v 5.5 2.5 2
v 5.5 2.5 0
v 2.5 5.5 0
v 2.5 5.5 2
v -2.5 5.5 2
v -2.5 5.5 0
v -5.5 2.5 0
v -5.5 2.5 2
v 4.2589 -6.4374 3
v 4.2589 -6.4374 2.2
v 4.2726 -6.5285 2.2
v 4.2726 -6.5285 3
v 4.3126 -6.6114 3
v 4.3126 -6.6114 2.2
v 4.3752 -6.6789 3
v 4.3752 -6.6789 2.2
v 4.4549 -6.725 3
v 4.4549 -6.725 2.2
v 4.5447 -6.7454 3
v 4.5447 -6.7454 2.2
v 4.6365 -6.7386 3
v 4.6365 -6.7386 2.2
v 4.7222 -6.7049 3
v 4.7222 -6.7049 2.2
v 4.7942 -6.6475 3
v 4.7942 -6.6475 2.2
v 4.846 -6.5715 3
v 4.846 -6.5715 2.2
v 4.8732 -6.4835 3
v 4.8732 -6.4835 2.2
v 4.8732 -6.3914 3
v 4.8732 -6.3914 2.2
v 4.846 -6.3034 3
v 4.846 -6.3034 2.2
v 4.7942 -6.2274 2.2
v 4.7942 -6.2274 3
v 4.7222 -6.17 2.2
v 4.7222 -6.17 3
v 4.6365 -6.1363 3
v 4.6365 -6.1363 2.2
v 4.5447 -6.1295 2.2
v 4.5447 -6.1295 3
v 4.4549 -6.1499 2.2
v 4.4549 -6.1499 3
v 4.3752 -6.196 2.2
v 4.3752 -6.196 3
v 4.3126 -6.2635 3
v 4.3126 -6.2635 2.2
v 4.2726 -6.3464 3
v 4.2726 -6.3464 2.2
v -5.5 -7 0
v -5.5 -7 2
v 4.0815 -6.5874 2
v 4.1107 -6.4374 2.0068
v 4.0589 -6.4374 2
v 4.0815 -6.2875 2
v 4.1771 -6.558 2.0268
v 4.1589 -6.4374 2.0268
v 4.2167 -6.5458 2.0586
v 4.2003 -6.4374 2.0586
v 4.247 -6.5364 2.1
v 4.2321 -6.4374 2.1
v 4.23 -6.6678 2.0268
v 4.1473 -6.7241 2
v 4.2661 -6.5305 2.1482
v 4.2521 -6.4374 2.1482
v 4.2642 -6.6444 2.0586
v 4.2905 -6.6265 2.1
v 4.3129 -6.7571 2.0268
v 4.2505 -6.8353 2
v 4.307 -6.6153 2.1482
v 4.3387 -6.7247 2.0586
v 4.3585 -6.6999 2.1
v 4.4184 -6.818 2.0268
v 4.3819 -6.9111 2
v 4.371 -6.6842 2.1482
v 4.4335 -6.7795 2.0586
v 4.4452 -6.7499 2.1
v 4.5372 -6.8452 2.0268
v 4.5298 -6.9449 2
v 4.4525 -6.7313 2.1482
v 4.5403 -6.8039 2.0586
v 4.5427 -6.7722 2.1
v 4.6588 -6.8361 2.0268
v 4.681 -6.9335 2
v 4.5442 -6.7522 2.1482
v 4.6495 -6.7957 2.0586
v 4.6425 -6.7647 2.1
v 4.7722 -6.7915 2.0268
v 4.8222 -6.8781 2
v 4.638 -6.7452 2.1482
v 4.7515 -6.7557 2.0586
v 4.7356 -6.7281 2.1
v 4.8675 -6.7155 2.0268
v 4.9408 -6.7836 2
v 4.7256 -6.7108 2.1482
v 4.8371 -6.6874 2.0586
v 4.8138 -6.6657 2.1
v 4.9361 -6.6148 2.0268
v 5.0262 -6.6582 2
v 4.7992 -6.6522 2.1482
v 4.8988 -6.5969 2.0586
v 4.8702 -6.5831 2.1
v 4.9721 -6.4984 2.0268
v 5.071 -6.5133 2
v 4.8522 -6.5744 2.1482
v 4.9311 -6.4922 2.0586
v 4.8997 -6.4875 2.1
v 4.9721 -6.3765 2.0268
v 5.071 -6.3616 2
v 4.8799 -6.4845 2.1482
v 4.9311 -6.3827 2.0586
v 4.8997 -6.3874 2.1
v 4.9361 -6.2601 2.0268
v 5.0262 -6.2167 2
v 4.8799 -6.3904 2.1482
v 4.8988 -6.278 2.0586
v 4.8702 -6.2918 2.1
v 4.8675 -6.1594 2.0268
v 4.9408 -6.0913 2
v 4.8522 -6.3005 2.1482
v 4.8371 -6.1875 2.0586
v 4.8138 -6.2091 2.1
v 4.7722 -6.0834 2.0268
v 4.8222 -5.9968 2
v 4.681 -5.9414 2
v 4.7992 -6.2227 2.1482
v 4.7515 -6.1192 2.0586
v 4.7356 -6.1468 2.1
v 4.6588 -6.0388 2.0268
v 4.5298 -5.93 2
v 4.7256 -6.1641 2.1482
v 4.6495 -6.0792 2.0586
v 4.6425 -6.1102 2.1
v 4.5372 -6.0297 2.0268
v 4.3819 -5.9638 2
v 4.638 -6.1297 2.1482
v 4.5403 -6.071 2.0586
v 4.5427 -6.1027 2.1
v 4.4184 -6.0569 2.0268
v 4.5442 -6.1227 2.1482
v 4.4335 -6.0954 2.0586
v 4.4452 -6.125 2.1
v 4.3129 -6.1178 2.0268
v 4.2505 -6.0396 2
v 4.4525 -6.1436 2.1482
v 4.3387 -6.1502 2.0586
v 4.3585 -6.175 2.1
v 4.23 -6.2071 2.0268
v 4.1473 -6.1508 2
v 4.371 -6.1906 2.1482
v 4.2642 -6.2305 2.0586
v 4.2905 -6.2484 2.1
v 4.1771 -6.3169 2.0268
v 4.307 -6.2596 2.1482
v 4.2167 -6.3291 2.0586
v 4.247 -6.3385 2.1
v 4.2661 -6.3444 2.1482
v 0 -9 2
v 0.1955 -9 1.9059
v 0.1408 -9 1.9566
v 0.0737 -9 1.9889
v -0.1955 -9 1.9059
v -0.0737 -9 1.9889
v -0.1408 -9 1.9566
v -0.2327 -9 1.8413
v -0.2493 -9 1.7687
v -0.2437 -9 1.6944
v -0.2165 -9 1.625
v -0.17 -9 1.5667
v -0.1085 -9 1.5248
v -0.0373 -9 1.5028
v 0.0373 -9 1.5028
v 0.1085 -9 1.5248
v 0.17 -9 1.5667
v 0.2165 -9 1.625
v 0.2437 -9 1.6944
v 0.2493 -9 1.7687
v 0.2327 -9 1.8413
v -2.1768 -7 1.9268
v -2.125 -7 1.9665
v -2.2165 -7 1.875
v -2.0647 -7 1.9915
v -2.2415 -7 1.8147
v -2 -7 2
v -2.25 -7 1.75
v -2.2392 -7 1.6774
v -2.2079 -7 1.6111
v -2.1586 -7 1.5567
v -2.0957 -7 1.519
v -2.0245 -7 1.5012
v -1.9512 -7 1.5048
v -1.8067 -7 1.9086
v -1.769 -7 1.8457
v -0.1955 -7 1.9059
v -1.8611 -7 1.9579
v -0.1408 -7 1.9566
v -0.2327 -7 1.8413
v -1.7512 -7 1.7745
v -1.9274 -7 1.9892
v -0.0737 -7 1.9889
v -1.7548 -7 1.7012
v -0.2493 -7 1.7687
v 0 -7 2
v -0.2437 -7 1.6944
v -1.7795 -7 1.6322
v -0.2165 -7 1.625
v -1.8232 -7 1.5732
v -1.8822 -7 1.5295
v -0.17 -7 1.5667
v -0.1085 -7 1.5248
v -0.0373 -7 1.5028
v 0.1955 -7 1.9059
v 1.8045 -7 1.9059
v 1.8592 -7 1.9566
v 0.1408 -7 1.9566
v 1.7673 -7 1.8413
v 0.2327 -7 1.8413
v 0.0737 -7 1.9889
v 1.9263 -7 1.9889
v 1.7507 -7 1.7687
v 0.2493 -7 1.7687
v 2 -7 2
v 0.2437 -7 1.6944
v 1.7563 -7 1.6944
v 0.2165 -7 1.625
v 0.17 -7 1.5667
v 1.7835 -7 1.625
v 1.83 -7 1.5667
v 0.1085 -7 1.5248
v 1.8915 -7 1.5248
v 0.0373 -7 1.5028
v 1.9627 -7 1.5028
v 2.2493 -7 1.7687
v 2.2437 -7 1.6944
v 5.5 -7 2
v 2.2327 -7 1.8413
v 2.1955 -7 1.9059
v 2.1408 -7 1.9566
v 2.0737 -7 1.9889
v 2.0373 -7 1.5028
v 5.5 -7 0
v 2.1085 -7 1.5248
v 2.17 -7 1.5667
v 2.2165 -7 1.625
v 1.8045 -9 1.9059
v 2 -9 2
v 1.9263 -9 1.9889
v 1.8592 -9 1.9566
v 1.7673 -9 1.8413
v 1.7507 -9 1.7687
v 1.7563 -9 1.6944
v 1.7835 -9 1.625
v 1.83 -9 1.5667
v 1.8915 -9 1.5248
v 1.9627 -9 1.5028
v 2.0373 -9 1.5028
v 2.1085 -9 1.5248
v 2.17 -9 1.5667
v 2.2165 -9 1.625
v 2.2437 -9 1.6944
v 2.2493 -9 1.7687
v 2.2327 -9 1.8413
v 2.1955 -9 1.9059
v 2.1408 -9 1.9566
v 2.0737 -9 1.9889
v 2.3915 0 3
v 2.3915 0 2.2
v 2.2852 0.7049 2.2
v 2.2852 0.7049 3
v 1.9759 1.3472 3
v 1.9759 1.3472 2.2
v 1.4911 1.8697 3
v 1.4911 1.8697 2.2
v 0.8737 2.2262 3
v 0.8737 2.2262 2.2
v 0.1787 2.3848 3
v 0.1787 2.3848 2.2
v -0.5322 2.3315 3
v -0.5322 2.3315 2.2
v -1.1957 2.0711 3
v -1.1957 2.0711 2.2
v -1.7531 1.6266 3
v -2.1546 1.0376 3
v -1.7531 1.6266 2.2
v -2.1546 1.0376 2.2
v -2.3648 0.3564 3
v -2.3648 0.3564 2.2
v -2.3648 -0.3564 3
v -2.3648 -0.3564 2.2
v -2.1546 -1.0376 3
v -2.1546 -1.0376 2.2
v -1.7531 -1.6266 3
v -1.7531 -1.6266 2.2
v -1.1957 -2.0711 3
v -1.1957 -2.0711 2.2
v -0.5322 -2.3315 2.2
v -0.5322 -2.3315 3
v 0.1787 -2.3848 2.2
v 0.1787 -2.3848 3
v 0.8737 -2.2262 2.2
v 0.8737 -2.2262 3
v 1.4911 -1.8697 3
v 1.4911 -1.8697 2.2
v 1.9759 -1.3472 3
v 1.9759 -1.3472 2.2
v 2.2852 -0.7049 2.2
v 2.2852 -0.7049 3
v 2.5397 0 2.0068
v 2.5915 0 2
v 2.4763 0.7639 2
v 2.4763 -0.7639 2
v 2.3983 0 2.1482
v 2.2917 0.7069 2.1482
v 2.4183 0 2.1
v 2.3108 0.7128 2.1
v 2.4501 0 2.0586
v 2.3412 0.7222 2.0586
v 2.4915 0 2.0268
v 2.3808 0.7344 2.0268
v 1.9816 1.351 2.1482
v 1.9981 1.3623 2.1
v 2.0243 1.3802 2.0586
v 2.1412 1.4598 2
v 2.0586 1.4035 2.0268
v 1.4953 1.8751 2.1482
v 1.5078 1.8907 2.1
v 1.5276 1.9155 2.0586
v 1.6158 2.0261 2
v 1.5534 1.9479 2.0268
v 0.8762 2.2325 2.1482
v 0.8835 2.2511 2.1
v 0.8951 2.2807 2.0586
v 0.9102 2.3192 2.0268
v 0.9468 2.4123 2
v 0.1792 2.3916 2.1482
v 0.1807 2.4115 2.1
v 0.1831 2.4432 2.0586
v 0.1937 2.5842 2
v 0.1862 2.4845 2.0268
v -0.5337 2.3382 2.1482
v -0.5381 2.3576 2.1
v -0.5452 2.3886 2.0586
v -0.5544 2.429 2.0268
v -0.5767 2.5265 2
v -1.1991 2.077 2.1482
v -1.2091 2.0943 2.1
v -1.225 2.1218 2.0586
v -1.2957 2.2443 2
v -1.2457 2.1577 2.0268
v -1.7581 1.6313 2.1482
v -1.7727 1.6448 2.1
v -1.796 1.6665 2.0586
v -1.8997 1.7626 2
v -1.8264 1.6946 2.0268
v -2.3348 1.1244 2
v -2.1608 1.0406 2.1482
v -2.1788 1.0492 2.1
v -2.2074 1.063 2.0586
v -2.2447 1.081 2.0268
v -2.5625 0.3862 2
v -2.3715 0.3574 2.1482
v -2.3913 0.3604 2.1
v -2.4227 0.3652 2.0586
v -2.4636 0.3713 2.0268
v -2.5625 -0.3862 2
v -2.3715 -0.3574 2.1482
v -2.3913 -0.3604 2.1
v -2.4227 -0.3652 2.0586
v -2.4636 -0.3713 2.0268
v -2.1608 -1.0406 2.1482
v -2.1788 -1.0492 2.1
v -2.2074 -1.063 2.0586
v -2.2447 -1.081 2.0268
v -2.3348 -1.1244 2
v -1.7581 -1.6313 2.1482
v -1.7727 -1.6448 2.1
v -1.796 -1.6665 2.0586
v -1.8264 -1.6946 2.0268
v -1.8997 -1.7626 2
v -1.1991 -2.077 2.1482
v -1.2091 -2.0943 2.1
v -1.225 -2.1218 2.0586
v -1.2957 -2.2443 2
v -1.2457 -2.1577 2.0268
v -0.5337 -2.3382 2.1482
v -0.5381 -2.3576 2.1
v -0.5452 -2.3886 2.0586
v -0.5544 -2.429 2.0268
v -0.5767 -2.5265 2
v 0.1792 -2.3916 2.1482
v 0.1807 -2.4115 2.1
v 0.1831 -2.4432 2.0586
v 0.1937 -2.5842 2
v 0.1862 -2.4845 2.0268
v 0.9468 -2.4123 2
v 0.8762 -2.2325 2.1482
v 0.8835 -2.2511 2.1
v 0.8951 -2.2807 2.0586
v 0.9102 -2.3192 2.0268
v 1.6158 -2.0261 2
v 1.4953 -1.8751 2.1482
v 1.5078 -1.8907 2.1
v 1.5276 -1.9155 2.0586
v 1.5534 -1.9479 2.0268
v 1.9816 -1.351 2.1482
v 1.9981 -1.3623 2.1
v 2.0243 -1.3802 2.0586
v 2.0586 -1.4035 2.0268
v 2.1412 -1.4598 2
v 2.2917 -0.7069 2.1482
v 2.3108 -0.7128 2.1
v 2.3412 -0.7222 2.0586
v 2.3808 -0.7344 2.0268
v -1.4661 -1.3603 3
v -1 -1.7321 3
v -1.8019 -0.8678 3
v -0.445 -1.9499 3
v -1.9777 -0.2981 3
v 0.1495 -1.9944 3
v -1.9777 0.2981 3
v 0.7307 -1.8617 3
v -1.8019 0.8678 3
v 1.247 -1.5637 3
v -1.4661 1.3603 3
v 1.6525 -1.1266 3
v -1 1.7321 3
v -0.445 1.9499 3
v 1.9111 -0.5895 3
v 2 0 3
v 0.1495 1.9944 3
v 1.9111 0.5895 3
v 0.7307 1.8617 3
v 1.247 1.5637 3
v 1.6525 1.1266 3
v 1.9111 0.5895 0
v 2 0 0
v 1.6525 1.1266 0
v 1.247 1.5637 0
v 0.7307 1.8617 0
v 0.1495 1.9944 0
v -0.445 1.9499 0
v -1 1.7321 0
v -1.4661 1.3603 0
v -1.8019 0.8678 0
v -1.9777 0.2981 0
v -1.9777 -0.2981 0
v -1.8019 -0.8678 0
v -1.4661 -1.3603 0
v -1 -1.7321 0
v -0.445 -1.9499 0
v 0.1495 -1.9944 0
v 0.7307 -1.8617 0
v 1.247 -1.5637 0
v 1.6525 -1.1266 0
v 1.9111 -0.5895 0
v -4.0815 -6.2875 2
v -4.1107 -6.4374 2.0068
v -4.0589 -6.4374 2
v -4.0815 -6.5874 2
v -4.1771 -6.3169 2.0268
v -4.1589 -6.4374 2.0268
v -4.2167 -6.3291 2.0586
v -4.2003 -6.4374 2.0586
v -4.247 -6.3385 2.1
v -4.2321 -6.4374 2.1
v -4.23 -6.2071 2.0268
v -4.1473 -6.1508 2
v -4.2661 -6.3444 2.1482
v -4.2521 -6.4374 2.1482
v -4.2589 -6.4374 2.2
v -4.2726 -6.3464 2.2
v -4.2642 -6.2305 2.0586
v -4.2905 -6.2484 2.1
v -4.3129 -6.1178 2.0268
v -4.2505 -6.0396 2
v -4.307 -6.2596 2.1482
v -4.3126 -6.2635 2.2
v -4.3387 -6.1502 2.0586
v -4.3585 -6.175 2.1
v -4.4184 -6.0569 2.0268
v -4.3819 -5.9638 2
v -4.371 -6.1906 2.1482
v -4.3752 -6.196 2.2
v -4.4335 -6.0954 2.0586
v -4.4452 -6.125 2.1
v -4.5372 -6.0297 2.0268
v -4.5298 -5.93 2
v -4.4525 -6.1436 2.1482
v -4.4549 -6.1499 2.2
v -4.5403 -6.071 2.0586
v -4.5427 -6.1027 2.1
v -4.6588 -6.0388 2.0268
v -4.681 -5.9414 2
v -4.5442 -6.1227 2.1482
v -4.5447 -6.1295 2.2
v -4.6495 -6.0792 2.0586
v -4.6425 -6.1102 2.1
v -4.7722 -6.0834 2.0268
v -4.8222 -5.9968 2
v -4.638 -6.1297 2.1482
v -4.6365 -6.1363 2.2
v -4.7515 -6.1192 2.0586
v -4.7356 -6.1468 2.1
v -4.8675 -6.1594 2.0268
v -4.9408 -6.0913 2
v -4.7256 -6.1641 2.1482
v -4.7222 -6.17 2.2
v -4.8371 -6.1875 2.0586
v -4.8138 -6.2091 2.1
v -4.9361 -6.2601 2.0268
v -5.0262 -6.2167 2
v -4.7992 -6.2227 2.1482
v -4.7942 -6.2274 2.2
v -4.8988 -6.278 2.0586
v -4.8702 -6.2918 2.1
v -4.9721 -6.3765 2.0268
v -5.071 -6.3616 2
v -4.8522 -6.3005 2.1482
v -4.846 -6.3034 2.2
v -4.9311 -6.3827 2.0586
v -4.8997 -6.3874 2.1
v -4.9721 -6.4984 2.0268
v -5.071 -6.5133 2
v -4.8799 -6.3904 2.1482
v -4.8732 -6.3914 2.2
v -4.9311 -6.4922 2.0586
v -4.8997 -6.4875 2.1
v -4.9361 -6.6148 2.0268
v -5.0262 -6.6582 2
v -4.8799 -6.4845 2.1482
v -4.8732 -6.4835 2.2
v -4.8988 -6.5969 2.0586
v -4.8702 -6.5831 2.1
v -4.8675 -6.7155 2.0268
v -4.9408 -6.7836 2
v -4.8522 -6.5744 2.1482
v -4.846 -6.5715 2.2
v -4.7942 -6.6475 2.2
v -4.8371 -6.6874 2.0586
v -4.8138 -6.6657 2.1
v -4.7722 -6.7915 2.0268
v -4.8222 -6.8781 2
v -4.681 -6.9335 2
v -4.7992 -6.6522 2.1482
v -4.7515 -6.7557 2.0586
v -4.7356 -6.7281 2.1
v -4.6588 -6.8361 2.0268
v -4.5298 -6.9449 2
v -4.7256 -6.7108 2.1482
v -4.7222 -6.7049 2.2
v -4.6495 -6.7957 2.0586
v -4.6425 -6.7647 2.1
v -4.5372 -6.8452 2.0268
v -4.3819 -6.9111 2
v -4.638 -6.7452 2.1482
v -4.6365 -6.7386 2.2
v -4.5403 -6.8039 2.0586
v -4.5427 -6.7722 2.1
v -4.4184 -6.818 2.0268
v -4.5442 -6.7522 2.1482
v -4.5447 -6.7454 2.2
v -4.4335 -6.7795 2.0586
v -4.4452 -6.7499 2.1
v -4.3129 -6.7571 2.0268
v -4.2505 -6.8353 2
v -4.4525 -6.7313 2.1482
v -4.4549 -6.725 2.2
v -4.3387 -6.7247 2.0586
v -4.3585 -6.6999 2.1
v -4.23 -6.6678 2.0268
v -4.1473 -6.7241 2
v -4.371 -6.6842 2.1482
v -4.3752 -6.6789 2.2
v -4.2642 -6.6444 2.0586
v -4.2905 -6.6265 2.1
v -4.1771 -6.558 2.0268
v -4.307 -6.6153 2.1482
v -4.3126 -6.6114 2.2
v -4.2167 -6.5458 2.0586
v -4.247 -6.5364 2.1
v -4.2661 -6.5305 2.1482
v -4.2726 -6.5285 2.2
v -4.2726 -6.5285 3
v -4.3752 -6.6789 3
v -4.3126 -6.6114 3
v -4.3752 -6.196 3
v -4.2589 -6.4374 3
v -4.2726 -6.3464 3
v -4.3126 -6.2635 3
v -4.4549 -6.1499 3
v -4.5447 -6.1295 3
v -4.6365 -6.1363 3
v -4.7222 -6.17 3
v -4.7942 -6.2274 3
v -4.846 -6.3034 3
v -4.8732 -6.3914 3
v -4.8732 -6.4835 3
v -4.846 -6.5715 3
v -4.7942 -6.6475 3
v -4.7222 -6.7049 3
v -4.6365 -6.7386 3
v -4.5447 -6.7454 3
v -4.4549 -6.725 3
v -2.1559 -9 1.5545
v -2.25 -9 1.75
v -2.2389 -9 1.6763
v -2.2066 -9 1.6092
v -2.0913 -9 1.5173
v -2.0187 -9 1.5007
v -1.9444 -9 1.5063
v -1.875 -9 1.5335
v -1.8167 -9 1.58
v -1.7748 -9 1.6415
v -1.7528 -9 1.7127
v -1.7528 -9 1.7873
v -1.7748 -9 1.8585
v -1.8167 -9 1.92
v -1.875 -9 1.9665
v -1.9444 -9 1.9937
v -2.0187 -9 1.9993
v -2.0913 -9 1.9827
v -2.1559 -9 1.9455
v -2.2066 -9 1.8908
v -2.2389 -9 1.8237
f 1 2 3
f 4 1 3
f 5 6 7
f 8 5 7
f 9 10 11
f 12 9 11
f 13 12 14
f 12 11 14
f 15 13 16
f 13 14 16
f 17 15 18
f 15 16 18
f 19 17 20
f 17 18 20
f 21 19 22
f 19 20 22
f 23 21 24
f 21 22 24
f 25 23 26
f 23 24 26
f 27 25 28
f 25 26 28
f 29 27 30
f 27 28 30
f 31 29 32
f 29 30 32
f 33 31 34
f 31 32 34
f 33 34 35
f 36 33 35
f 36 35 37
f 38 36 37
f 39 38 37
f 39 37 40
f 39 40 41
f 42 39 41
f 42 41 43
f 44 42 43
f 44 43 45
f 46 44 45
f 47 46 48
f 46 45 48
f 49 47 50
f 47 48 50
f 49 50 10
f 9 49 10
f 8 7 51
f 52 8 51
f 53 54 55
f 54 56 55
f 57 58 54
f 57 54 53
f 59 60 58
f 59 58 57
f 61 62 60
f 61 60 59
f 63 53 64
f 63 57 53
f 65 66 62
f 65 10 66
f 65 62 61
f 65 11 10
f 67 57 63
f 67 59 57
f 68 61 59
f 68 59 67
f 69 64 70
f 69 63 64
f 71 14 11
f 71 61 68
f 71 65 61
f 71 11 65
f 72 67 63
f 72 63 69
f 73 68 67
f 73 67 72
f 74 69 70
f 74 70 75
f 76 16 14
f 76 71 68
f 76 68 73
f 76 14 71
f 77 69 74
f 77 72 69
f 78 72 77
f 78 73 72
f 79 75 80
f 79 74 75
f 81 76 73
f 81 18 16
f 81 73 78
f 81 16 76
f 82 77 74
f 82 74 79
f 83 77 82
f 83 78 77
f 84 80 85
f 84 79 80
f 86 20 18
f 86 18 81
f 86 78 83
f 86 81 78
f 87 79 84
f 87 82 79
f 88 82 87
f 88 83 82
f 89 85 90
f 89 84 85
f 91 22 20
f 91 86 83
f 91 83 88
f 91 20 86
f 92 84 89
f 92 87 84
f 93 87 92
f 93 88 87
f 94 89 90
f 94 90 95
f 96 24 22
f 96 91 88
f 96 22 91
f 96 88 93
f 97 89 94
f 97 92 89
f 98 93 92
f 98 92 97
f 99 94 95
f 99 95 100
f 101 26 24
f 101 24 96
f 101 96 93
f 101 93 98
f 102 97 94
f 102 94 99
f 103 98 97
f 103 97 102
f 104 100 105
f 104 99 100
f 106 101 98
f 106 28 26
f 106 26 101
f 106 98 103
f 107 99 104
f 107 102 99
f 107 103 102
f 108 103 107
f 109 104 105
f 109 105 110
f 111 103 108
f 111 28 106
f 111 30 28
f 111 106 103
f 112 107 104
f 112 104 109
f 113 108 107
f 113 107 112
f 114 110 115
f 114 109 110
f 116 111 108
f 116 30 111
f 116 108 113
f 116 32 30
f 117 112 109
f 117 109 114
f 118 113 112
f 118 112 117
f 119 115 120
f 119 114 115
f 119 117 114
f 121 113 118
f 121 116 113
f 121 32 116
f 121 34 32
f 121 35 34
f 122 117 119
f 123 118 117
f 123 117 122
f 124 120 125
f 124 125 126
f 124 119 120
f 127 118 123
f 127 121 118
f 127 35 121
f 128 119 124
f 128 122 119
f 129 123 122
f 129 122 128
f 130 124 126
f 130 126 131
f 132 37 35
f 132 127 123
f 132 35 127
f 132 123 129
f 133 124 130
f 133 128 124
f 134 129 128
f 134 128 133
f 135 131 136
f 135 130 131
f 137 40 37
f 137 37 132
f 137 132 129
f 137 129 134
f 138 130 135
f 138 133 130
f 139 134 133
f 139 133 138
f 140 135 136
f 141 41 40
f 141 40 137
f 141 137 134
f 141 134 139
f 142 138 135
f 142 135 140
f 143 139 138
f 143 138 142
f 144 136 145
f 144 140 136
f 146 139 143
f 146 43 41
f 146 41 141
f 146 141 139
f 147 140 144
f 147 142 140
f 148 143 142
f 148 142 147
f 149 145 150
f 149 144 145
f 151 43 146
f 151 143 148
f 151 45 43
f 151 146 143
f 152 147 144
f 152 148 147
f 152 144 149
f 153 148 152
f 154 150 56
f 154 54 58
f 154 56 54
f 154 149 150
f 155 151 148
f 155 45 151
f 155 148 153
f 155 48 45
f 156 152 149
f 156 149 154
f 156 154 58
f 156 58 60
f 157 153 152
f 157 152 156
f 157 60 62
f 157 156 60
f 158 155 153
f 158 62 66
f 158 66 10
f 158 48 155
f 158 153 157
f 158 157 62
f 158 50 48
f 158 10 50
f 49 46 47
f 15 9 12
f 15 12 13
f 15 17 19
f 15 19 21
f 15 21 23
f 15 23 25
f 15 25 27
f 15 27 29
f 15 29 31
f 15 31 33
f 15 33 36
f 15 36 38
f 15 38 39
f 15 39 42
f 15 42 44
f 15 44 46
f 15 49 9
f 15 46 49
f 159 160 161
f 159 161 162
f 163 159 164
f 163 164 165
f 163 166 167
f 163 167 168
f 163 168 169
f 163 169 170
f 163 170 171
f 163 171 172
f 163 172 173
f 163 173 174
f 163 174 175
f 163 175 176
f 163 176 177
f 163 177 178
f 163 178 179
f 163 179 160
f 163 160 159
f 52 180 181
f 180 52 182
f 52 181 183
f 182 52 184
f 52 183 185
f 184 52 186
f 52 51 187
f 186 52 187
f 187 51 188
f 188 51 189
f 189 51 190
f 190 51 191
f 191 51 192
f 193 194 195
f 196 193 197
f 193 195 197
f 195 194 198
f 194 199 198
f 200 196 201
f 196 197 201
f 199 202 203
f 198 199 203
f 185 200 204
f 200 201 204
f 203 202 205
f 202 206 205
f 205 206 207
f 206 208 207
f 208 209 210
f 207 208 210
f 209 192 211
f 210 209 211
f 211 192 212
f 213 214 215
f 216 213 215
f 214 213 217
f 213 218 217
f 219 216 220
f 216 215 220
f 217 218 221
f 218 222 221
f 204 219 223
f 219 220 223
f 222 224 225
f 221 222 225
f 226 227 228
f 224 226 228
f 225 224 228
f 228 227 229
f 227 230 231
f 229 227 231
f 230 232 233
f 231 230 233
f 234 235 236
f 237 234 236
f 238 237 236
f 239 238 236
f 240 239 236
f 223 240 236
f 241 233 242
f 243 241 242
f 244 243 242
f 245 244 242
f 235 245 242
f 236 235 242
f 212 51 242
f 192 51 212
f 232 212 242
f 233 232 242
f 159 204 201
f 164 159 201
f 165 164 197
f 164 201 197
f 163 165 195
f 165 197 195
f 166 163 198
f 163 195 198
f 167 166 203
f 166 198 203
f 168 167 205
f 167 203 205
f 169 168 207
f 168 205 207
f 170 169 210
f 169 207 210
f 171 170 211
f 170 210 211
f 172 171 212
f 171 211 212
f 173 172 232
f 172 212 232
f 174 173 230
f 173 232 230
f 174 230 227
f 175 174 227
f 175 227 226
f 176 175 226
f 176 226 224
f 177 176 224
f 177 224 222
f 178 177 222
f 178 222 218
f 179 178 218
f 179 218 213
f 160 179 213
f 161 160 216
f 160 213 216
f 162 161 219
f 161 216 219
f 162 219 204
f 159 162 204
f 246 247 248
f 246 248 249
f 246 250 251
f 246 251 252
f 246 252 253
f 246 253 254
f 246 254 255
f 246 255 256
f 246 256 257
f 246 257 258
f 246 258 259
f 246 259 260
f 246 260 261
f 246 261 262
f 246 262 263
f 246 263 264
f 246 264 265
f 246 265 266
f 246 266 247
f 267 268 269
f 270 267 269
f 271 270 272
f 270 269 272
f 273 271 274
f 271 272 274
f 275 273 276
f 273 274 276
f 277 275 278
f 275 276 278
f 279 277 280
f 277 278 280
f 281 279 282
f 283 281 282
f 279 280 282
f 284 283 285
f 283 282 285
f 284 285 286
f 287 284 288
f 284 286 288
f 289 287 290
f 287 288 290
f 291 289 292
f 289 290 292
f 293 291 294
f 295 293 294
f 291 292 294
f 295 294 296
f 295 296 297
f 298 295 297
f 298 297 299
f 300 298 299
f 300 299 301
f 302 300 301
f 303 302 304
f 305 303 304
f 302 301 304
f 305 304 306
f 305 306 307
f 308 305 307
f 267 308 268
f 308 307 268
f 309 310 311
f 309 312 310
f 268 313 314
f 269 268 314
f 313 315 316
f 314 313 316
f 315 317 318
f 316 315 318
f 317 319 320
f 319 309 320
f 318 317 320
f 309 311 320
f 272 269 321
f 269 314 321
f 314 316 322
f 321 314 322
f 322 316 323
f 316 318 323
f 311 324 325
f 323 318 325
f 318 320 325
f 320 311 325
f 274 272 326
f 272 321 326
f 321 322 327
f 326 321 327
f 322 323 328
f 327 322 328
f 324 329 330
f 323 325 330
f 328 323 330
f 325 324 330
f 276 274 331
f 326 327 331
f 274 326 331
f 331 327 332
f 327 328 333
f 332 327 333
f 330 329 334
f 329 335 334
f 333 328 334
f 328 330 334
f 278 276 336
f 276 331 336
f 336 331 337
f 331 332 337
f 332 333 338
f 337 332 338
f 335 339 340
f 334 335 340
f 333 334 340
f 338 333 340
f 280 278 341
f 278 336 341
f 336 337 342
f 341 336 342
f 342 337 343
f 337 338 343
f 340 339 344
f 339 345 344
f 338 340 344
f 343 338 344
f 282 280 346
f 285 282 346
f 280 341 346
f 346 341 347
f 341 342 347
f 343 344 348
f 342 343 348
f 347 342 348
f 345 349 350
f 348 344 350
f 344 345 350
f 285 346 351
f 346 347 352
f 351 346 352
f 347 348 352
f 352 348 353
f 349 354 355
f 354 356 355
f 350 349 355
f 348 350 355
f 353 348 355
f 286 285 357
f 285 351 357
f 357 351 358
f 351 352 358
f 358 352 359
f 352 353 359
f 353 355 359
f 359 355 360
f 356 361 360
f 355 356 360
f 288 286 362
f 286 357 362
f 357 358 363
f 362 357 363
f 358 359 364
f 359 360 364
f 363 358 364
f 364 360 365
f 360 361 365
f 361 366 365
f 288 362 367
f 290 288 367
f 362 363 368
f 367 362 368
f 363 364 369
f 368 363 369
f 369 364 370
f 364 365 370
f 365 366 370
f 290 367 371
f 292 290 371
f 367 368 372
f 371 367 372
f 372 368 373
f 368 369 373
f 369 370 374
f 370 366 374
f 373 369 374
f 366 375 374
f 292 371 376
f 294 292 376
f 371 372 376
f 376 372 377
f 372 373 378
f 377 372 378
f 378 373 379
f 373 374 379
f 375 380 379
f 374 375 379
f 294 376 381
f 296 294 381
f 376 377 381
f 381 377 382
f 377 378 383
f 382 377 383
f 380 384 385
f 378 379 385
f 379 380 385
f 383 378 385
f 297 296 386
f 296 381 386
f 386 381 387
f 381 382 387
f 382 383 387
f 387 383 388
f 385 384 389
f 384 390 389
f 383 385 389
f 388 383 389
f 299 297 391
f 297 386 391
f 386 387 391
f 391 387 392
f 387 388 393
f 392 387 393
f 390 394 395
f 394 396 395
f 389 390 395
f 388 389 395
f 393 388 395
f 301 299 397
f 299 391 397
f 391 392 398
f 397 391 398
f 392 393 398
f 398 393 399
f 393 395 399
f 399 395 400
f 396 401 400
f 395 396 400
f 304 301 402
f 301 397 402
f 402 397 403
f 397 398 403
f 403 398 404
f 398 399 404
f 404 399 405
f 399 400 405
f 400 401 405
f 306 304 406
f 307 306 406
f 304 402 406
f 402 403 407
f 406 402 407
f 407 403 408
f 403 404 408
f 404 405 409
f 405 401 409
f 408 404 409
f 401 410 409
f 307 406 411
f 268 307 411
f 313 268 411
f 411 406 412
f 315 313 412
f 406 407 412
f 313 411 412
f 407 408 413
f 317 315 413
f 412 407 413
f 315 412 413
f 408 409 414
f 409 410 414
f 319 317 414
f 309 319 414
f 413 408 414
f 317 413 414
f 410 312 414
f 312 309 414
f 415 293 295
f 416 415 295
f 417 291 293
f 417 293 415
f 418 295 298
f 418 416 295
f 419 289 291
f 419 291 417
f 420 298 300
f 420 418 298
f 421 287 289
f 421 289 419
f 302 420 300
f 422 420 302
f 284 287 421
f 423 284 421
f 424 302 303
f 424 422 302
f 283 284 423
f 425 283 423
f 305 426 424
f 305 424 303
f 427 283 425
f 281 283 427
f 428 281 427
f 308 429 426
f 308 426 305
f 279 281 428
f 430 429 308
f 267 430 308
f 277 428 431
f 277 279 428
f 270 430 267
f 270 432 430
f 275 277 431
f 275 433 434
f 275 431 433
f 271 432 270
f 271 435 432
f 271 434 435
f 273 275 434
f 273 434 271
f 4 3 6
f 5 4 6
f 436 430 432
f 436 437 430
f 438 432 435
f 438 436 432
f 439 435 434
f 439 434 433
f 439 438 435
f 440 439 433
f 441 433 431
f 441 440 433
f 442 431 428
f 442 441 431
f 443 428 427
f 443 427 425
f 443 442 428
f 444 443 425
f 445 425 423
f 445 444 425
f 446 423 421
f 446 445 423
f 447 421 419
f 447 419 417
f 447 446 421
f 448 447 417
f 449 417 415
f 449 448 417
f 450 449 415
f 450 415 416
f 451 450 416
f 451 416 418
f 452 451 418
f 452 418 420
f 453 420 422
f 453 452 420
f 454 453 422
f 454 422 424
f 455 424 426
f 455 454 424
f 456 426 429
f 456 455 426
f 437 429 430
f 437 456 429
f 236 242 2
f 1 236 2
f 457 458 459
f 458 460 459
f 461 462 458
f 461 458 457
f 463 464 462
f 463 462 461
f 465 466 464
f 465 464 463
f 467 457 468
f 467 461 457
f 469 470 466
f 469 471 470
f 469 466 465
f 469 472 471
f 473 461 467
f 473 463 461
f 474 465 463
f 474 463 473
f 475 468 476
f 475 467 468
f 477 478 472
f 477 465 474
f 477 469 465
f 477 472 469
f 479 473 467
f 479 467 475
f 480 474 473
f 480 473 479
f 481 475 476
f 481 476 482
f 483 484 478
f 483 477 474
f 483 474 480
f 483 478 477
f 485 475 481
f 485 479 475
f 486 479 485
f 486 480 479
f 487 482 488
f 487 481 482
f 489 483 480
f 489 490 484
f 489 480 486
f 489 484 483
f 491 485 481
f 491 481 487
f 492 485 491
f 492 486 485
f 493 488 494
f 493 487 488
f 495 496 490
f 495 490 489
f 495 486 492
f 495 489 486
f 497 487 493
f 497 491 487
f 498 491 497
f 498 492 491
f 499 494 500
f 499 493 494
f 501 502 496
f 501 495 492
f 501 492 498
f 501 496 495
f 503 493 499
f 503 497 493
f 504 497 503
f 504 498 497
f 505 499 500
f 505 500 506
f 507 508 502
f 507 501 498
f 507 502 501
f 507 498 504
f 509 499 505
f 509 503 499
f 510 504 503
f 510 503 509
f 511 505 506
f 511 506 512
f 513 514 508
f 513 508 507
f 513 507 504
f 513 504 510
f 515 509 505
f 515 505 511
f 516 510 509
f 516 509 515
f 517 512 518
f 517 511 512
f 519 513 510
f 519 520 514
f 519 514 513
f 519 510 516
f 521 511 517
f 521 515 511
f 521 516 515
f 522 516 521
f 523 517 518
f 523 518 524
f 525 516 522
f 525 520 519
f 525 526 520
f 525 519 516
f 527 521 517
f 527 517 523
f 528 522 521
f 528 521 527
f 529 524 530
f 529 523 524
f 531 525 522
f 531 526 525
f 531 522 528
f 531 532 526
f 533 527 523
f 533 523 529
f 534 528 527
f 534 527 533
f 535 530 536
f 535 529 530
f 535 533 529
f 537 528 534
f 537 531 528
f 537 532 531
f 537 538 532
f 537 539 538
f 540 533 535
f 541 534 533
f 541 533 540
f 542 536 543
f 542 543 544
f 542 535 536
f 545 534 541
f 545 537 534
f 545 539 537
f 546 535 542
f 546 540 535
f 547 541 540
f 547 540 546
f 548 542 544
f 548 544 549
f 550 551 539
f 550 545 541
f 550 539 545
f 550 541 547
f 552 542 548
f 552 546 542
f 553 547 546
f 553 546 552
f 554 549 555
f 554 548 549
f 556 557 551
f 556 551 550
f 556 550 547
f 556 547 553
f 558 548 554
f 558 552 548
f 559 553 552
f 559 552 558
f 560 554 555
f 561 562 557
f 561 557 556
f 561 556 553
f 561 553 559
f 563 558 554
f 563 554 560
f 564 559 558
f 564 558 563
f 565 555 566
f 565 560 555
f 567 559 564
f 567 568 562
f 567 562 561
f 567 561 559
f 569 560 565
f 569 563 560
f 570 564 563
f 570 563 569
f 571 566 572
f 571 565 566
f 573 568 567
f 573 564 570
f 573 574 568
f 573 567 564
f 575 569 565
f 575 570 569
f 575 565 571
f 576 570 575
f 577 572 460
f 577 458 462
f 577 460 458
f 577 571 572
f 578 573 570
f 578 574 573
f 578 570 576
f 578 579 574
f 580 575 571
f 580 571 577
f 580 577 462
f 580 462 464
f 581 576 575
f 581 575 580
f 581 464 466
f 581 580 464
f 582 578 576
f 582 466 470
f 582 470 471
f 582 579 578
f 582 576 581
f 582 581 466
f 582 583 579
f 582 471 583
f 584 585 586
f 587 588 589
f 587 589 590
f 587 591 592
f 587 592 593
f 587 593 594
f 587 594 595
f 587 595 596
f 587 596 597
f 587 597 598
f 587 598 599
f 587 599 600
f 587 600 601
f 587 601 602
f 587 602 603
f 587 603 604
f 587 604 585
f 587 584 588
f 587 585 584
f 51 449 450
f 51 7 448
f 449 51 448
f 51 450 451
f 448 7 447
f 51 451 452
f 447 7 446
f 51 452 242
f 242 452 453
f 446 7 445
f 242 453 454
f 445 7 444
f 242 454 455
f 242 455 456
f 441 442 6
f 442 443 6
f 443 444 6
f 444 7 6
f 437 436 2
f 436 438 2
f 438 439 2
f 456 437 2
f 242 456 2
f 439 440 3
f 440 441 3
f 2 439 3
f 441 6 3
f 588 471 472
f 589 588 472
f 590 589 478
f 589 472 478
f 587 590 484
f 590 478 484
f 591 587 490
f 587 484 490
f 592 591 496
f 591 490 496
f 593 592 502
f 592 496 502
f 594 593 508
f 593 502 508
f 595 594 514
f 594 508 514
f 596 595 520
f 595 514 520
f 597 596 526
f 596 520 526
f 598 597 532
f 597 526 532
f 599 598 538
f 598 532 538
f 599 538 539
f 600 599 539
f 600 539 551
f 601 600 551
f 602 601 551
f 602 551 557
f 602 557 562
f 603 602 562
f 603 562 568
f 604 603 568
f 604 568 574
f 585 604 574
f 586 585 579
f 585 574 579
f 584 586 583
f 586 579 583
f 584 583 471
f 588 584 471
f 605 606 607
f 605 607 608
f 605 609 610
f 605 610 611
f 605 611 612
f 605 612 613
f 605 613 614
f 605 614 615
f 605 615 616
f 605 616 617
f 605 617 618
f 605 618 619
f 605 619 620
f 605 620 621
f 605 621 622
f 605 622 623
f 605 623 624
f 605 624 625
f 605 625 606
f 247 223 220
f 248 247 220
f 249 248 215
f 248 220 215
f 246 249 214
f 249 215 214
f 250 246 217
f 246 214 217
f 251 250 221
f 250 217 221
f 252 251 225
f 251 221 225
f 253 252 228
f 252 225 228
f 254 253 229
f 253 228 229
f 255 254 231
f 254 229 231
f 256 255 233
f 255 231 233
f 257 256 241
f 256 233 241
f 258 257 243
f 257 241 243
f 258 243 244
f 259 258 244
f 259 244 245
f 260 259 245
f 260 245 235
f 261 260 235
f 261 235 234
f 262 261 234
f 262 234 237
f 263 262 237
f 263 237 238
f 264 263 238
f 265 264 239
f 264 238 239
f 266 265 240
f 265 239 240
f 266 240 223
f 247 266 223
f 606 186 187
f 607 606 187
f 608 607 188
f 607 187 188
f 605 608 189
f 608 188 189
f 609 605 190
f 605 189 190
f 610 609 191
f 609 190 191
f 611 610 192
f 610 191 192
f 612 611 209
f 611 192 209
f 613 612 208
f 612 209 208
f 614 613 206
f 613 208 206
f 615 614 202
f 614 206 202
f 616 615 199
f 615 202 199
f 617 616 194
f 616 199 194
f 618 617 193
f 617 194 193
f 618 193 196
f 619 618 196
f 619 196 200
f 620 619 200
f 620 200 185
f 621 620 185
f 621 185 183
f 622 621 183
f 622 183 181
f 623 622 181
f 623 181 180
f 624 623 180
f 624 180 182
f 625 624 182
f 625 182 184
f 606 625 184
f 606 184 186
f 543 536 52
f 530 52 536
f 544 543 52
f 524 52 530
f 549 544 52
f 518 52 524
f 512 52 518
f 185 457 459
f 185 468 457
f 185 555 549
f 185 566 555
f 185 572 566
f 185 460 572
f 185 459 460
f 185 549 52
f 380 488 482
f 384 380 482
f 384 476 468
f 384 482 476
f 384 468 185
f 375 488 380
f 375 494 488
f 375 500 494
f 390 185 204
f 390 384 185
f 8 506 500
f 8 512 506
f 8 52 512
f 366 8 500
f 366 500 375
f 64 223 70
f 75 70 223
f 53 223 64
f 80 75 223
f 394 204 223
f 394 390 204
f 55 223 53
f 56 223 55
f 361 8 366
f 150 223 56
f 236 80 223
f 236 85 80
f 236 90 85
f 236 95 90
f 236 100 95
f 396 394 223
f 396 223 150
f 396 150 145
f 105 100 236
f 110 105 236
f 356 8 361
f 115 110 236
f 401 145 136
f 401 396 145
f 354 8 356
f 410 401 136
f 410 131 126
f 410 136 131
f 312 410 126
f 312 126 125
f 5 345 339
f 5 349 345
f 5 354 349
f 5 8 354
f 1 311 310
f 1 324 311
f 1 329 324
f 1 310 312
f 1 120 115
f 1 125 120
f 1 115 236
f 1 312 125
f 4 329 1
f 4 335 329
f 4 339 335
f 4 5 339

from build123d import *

# Parameters (mm, degrees)
SKETCH1_R           = 2
BOSS_EXTRUDE1_DEPTH = 2
SKETCH2_R           = 2.391473365
SKETCH2_R_2         = 2
SKETCH2_R_3         = 0.308853545
BOSS_EXTRUDE2_DEPTH = 1
FILLET1_R           = 0.2
SKETCH3_R           = 0.25
BOSS_EXTRUDE3_DEPTH = 2


with BuildPart() as part:
    # Sketch1 → Boss-Extrude1 (new body)
    with BuildSketch(Plane.XY):
        Polygon((0, -7), (5.5, -7), (5.5, 2.5), (2.5, 5.5), (-2.5, 5.5), (-5.5, 2.5), (-5.5, -7), align=None)
        Circle(SKETCH1_R, mode=Mode.SUBTRACT)
    extrude(amount=BOSS_EXTRUDE1_DEPTH)

    # Sketch2 → Boss-Extrude2 (add)
    # profile 1 of 3: a face of its own
    with BuildSketch(Plane.XY.offset(2)):
        Circle(SKETCH2_R)
        Circle(SKETCH2_R_2, mode=Mode.SUBTRACT)
    # profile 2 of 3: a face of its own
    with BuildSketch(Plane.XY.offset(2)):
        with Locations((-4.567781371, -6.437447931)):
            Circle(SKETCH2_R_3)
    # profile 3 of 3: a face of its own
    with BuildSketch(Plane.XY.offset(2)):
        with Locations(Location((4.567781371, -6.437447931, 0), (0, 0, 180))):
            Circle(SKETCH2_R_3)
    extrude(amount=BOSS_EXTRUDE2_DEPTH)

    # Fillet1
    fillet1_edges = [part.edges().sort_by_distance(p)[0] for p in [
        (-2.391473365, 0, 2),
        (-4.876634915, -6.437447931, 2),
        (4.876634915, -6.437447931, 2),
    ]]
    fillet(fillet1_edges, radius=FILLET1_R)

    # Sketch3 → Boss-Extrude3 (add)
    with BuildSketch(Plane.XZ.offset(7)):
        with Locations(Location((0, 1.75, 0), (0, 0, 90))):
            Circle(SKETCH3_R)
        with Locations(Location((2, 1.75, 0), (0, 0, 90))):
            Circle(SKETCH3_R)
        with Locations(Location((-2, 1.75, 0), (0, 0, 180))):
            Circle(SKETCH3_R)
    extrude(amount=BOSS_EXTRUDE3_DEPTH)


solid = part.part
